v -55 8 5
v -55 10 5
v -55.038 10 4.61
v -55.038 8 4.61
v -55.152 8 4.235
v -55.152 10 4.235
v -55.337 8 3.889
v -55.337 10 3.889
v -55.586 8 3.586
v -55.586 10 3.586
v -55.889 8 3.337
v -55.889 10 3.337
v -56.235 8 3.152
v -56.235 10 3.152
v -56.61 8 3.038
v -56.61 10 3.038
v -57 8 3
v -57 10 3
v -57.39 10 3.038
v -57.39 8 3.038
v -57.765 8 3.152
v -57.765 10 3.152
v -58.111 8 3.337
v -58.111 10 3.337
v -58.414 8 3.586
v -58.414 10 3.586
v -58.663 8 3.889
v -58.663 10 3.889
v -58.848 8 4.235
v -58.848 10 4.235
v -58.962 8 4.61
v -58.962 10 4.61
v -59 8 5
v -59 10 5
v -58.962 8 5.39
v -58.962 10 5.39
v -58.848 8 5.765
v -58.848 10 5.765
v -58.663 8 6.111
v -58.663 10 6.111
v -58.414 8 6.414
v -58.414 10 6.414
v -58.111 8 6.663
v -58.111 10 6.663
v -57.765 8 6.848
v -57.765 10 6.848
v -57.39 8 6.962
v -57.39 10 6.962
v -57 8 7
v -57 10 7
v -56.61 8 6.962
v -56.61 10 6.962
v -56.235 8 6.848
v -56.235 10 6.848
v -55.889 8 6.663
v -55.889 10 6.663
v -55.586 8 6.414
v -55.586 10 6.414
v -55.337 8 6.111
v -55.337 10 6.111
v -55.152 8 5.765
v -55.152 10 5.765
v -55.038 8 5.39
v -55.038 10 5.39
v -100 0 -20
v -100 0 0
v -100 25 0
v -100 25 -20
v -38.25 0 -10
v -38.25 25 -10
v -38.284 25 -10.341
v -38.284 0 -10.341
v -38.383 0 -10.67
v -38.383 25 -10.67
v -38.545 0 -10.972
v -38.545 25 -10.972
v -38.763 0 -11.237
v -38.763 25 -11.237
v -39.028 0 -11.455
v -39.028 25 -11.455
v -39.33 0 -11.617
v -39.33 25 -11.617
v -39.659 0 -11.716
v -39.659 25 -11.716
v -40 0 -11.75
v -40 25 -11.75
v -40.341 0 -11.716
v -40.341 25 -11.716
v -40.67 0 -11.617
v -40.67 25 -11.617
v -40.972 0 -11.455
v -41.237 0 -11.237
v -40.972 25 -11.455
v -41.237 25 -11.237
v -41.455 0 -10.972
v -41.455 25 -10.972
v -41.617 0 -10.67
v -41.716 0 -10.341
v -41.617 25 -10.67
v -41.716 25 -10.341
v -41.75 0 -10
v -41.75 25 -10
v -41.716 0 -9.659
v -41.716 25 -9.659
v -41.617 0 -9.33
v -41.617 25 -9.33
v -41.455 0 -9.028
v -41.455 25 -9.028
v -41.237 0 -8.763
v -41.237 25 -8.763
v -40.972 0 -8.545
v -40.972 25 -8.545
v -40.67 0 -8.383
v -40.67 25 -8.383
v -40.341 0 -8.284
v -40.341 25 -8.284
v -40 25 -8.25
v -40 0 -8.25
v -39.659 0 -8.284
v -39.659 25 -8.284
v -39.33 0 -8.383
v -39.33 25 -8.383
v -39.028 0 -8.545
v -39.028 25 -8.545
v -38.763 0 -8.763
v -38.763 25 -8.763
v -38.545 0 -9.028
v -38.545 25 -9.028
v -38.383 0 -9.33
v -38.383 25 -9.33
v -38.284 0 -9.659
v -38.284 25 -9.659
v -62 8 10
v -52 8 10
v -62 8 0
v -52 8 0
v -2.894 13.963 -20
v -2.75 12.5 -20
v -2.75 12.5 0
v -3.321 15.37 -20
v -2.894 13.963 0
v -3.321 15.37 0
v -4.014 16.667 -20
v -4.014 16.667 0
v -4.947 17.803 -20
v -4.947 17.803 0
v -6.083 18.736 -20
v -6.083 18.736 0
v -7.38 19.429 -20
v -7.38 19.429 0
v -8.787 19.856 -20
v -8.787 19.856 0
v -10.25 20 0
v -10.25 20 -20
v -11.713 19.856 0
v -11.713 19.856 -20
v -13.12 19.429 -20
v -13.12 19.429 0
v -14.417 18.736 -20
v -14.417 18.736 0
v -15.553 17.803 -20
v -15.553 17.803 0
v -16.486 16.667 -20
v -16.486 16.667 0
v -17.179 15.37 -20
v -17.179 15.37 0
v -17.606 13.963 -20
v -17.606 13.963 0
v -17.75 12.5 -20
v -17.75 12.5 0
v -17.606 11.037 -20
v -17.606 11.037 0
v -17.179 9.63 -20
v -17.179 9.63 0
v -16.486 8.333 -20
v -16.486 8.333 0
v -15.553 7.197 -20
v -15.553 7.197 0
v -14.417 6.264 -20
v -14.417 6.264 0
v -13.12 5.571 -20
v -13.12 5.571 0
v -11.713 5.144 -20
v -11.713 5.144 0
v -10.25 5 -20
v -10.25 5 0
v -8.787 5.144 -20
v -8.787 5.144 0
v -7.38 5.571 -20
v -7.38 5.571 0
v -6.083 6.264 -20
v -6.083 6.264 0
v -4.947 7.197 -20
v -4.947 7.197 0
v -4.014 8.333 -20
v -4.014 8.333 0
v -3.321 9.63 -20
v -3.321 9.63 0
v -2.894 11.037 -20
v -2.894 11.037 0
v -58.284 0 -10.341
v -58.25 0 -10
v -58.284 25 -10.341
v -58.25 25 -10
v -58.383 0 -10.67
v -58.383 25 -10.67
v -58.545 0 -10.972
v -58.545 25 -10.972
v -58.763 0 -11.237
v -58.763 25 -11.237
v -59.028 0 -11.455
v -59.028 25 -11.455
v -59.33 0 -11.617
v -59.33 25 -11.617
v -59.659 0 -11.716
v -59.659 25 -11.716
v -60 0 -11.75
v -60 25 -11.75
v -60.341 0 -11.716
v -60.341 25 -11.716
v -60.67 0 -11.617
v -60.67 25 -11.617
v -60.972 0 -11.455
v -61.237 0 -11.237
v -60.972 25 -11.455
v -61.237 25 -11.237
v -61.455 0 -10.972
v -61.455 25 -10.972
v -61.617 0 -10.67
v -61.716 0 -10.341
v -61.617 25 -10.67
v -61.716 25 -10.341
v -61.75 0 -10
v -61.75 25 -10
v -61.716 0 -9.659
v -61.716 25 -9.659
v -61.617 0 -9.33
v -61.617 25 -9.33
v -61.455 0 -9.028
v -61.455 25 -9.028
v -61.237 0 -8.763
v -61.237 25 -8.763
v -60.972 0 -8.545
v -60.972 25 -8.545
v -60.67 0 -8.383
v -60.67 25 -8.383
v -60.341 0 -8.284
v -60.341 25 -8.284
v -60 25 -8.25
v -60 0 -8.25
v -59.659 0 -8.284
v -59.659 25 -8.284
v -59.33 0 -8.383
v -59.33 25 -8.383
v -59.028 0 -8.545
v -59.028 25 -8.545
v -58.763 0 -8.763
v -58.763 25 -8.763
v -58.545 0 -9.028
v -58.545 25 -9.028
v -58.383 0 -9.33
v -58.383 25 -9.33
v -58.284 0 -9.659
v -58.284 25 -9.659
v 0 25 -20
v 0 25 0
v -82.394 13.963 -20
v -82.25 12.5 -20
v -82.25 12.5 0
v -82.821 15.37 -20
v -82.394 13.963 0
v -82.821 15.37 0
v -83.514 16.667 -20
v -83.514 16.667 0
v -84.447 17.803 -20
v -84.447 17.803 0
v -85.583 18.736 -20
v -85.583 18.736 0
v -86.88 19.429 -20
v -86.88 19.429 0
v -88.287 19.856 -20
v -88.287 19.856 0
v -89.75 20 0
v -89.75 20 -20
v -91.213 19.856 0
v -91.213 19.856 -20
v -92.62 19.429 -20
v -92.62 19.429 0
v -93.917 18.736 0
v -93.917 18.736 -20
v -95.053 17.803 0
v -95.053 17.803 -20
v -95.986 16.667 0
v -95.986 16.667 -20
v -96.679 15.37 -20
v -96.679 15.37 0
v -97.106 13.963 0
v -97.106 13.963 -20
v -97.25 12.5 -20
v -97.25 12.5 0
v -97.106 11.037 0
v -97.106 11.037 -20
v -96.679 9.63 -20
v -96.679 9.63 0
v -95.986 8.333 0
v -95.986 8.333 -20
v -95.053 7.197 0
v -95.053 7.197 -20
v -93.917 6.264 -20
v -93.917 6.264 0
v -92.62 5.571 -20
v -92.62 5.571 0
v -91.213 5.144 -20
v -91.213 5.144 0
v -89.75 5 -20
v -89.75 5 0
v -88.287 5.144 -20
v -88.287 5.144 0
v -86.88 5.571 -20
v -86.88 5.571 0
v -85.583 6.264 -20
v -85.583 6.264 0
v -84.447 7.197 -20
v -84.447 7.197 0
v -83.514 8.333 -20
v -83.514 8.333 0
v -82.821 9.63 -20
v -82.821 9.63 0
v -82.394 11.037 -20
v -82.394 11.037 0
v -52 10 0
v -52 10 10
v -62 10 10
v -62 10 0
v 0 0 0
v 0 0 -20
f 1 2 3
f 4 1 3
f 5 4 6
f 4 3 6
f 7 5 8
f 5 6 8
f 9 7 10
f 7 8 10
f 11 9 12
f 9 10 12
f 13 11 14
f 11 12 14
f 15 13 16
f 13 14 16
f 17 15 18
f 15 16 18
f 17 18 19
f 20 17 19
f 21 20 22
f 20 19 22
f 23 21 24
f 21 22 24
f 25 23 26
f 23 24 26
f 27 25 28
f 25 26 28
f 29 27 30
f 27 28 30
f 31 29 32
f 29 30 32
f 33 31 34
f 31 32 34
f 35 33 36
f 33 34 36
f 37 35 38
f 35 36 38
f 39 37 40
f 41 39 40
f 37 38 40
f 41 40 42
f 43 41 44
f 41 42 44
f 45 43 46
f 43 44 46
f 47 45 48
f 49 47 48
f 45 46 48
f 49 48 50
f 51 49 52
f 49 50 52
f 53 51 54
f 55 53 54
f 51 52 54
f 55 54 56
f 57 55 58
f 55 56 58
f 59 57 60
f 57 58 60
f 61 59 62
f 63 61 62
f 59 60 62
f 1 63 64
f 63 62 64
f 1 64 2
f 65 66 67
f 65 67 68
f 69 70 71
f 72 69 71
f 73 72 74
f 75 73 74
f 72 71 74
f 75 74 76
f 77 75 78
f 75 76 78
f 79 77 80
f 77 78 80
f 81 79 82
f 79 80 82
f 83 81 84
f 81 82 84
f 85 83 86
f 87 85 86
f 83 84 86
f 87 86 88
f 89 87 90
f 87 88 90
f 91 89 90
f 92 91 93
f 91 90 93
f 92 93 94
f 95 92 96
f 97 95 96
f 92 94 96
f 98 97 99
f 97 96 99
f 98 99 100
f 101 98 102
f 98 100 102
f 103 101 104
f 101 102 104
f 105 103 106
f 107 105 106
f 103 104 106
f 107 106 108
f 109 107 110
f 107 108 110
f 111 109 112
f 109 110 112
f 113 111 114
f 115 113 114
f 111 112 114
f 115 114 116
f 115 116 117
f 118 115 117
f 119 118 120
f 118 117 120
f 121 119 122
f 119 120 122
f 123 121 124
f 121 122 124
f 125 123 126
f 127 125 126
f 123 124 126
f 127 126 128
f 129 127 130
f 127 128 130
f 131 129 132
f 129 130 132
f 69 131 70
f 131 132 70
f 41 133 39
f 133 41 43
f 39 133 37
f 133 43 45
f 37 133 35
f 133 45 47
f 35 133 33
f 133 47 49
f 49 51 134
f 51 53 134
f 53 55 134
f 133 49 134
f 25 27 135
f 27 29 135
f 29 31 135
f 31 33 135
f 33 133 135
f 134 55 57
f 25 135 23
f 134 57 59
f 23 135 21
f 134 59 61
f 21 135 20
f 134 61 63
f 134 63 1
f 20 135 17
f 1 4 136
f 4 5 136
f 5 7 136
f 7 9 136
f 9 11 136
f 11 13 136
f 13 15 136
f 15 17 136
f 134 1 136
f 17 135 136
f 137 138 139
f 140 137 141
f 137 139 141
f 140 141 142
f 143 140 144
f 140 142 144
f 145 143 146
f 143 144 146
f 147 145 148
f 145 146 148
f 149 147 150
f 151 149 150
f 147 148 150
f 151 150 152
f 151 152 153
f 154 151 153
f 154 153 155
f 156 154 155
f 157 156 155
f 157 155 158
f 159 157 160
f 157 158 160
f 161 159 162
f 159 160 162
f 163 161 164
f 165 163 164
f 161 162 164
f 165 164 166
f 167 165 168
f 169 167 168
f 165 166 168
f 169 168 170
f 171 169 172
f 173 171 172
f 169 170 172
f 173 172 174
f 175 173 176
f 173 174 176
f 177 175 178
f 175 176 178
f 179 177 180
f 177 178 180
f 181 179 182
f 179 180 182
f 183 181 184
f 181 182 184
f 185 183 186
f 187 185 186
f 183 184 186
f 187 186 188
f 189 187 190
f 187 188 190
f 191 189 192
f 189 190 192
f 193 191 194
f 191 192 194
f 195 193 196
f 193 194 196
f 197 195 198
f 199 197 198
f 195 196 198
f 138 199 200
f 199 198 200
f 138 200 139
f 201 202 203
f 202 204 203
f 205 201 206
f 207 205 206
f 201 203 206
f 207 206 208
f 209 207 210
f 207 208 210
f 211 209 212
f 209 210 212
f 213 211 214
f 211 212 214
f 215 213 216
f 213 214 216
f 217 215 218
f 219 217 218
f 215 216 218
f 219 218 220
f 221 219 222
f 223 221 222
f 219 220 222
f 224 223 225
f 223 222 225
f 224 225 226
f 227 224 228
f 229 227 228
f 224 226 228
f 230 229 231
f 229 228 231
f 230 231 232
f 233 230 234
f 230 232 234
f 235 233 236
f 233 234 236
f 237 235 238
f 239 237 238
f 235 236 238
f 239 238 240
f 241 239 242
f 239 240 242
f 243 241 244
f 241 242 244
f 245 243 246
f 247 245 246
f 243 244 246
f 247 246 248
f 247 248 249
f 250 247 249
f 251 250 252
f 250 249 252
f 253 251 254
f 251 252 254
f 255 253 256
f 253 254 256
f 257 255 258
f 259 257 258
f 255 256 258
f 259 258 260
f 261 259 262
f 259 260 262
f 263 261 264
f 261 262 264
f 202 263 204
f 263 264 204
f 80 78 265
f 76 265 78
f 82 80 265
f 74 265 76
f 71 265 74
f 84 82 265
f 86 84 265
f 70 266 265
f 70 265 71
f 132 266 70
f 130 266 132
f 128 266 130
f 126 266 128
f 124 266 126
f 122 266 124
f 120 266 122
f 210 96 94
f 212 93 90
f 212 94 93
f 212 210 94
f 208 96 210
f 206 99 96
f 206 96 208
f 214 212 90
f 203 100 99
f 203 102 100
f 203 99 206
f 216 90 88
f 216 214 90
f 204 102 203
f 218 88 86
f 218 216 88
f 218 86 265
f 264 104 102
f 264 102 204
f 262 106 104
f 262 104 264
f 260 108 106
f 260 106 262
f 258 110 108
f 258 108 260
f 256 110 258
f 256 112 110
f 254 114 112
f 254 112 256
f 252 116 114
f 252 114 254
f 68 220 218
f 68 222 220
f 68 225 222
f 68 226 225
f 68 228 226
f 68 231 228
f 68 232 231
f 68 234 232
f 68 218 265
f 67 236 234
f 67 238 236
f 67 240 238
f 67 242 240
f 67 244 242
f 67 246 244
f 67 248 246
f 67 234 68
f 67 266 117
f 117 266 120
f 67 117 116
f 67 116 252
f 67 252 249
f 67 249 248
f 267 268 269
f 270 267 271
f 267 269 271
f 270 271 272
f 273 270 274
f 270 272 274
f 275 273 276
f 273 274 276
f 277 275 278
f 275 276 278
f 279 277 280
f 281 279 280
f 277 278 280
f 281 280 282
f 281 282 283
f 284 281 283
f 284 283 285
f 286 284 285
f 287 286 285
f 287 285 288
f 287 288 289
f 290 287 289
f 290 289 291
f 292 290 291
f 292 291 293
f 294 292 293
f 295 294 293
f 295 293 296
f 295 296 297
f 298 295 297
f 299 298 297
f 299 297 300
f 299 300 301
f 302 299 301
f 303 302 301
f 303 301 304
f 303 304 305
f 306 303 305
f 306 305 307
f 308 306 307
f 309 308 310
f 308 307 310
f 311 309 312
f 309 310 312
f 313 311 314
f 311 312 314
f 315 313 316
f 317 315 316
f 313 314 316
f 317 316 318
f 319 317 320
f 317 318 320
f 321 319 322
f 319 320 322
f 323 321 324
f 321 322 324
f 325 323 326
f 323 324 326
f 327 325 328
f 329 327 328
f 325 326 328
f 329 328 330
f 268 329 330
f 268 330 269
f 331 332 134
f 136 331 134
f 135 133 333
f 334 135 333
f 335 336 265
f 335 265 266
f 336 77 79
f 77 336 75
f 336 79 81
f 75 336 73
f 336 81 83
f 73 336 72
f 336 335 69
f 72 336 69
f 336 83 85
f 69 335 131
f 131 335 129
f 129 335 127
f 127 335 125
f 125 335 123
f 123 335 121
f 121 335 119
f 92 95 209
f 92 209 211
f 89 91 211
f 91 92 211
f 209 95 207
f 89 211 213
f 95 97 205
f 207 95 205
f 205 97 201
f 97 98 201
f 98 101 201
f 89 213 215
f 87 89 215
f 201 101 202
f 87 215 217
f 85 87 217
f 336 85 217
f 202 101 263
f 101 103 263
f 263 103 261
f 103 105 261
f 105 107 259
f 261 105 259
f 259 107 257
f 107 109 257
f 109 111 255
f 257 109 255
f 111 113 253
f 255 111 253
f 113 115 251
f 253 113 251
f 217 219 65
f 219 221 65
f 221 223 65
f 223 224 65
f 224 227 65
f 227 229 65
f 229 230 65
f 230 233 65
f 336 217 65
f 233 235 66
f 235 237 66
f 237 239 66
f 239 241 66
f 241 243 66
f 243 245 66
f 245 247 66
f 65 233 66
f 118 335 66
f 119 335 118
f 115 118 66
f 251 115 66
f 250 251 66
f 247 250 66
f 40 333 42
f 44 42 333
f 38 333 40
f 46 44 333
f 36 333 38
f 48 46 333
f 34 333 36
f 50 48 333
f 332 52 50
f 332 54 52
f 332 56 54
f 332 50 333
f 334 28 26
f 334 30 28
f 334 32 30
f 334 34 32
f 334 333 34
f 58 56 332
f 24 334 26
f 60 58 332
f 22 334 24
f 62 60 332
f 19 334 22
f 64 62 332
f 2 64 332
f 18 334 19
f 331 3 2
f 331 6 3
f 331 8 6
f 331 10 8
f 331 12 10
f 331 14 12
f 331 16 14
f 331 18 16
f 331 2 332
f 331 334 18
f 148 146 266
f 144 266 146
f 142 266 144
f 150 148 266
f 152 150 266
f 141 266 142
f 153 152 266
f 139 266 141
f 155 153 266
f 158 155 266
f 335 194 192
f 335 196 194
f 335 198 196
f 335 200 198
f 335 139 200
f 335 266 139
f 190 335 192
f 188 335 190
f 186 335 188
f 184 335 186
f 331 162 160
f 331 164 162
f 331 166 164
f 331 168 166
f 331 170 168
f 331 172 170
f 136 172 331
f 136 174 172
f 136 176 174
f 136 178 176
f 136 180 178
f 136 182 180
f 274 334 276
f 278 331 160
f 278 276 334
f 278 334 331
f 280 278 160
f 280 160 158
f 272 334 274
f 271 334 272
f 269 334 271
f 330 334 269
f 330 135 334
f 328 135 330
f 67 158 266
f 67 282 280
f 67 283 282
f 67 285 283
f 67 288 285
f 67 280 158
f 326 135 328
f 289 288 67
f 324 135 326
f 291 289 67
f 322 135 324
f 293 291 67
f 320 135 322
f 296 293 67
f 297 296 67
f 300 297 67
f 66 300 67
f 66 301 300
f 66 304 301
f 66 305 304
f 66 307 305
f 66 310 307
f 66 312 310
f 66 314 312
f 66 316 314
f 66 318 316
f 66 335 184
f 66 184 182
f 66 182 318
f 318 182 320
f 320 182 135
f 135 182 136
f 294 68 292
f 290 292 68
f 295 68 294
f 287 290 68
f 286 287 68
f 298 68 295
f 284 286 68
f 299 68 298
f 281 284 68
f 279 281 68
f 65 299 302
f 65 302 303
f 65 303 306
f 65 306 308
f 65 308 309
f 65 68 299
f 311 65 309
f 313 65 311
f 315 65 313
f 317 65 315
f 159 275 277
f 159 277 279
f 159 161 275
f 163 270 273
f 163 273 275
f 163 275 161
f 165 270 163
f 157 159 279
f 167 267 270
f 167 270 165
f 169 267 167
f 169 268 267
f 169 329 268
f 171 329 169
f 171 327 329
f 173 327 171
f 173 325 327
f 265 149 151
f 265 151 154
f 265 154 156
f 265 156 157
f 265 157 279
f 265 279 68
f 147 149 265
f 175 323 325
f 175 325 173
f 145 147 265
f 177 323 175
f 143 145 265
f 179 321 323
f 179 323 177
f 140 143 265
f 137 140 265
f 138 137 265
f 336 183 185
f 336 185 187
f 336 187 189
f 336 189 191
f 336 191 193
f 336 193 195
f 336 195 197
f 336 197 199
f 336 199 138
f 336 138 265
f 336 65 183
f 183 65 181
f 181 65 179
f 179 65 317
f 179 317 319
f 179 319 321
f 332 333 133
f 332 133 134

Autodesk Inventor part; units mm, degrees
ref_plane "YZ Plane" through (0, 0, 0) normal (1, 0, 0) x (0, 1, 0)
ref_plane "XZ Plane" through (0, 0, 0) normal (0, 1, 0) x (-1, 0, 0)
ref_plane "XY Plane" through (0, 0, 0) normal (0, 0, 1) x (1, 0, 0)
sketch "Sketch1" plane through (0, 0, 0) normal (0, 1, 0) x (-1, 0, 0)
  line L0 (0, 0) -> (100, 0)
  line L1 (100, 0) -> (100, -20)
  line L2 (100, -20) -> (0, -20)
  line L3 (0, -20) -> (0, 0)
  dimension "d0" = 100
  dimension "d1" = 20
extrude "Extrusion1" add sketch "Sketch1" along normal blind 25
sketch "Sketch2" plane through (-100, 0, 0) normal (0, 0, 1) x (1, 0, 0)
  point P0 (100, 0)
sketch "Sketch3" plane through (-100, 0, 0) normal (0, 0, 1) x (1, 0, 0)
  line L0 (0, 25) -> (100, 25) projected
  circle A0 centre (10.25, 12.5) radius 7.5
  circle A1 centre (89.75, 12.5) radius 7.5
  point P0 (100, 0)
  dimension "d7" = 15
  dimension "d8" = 15
extrude "Extrusion2" cut sketch "Sketch3" against normal blind 20
sketch "Sketch4" plane through (-100, 0, 0) normal (0, 0, 1) x (1, 0, 0)
  point P0 (100, 0)
sketch "Sketch5" plane through (-100, 0, 0) normal (0, 0, 1) x (1, 0, 0)
  line L0 (100, 25) -> (0, 25) projected
  line L1 (0, 25) -> (100, 25) projected
  line L2 (43, 8) -> (48, 8)
  line L3 (48, 8) -> (38, 8)
  line L4 (38, 8) -> (38, 10)
  line L5 (38, 10) -> (48, 10)
  line L6 (48, 10) -> (48, 8)
  point P0 (100, 0)
  dimension "d27" = 5
  dimension "d30" = 10
extrude "Extrusion3" add sketch "Sketch5" along normal blind 10
sketch "Sketch7" plane through (-62, 10, 0) normal (0, 1, 0) x (1, 0, 0)
  line L0 (0, -10) -> (10, -10) projected
  circle A0 centre (5, -5) radius 2
  point P0 (62, 0)
  dimension "d32" = 4
extrude "Extrusion5" cut sketch "Sketch7" against normal blind 2
sketch "Sketch8" plane through (0, 25, 0) normal (0, 1, 0) x (1, 0, 0)
  line L0 (0, 0) -> (0, 20) projected
  circle A0 centre (-60, 10) radius 1.75
  circle A1 centre (-40, 10) radius 1.75
  dimension "d37" = 3.5
  dimension "d38" = 3.5
extrude "Extrusion6" cut sketch "Sketch8" against normal blind 25
properties part number "g_griper side"
